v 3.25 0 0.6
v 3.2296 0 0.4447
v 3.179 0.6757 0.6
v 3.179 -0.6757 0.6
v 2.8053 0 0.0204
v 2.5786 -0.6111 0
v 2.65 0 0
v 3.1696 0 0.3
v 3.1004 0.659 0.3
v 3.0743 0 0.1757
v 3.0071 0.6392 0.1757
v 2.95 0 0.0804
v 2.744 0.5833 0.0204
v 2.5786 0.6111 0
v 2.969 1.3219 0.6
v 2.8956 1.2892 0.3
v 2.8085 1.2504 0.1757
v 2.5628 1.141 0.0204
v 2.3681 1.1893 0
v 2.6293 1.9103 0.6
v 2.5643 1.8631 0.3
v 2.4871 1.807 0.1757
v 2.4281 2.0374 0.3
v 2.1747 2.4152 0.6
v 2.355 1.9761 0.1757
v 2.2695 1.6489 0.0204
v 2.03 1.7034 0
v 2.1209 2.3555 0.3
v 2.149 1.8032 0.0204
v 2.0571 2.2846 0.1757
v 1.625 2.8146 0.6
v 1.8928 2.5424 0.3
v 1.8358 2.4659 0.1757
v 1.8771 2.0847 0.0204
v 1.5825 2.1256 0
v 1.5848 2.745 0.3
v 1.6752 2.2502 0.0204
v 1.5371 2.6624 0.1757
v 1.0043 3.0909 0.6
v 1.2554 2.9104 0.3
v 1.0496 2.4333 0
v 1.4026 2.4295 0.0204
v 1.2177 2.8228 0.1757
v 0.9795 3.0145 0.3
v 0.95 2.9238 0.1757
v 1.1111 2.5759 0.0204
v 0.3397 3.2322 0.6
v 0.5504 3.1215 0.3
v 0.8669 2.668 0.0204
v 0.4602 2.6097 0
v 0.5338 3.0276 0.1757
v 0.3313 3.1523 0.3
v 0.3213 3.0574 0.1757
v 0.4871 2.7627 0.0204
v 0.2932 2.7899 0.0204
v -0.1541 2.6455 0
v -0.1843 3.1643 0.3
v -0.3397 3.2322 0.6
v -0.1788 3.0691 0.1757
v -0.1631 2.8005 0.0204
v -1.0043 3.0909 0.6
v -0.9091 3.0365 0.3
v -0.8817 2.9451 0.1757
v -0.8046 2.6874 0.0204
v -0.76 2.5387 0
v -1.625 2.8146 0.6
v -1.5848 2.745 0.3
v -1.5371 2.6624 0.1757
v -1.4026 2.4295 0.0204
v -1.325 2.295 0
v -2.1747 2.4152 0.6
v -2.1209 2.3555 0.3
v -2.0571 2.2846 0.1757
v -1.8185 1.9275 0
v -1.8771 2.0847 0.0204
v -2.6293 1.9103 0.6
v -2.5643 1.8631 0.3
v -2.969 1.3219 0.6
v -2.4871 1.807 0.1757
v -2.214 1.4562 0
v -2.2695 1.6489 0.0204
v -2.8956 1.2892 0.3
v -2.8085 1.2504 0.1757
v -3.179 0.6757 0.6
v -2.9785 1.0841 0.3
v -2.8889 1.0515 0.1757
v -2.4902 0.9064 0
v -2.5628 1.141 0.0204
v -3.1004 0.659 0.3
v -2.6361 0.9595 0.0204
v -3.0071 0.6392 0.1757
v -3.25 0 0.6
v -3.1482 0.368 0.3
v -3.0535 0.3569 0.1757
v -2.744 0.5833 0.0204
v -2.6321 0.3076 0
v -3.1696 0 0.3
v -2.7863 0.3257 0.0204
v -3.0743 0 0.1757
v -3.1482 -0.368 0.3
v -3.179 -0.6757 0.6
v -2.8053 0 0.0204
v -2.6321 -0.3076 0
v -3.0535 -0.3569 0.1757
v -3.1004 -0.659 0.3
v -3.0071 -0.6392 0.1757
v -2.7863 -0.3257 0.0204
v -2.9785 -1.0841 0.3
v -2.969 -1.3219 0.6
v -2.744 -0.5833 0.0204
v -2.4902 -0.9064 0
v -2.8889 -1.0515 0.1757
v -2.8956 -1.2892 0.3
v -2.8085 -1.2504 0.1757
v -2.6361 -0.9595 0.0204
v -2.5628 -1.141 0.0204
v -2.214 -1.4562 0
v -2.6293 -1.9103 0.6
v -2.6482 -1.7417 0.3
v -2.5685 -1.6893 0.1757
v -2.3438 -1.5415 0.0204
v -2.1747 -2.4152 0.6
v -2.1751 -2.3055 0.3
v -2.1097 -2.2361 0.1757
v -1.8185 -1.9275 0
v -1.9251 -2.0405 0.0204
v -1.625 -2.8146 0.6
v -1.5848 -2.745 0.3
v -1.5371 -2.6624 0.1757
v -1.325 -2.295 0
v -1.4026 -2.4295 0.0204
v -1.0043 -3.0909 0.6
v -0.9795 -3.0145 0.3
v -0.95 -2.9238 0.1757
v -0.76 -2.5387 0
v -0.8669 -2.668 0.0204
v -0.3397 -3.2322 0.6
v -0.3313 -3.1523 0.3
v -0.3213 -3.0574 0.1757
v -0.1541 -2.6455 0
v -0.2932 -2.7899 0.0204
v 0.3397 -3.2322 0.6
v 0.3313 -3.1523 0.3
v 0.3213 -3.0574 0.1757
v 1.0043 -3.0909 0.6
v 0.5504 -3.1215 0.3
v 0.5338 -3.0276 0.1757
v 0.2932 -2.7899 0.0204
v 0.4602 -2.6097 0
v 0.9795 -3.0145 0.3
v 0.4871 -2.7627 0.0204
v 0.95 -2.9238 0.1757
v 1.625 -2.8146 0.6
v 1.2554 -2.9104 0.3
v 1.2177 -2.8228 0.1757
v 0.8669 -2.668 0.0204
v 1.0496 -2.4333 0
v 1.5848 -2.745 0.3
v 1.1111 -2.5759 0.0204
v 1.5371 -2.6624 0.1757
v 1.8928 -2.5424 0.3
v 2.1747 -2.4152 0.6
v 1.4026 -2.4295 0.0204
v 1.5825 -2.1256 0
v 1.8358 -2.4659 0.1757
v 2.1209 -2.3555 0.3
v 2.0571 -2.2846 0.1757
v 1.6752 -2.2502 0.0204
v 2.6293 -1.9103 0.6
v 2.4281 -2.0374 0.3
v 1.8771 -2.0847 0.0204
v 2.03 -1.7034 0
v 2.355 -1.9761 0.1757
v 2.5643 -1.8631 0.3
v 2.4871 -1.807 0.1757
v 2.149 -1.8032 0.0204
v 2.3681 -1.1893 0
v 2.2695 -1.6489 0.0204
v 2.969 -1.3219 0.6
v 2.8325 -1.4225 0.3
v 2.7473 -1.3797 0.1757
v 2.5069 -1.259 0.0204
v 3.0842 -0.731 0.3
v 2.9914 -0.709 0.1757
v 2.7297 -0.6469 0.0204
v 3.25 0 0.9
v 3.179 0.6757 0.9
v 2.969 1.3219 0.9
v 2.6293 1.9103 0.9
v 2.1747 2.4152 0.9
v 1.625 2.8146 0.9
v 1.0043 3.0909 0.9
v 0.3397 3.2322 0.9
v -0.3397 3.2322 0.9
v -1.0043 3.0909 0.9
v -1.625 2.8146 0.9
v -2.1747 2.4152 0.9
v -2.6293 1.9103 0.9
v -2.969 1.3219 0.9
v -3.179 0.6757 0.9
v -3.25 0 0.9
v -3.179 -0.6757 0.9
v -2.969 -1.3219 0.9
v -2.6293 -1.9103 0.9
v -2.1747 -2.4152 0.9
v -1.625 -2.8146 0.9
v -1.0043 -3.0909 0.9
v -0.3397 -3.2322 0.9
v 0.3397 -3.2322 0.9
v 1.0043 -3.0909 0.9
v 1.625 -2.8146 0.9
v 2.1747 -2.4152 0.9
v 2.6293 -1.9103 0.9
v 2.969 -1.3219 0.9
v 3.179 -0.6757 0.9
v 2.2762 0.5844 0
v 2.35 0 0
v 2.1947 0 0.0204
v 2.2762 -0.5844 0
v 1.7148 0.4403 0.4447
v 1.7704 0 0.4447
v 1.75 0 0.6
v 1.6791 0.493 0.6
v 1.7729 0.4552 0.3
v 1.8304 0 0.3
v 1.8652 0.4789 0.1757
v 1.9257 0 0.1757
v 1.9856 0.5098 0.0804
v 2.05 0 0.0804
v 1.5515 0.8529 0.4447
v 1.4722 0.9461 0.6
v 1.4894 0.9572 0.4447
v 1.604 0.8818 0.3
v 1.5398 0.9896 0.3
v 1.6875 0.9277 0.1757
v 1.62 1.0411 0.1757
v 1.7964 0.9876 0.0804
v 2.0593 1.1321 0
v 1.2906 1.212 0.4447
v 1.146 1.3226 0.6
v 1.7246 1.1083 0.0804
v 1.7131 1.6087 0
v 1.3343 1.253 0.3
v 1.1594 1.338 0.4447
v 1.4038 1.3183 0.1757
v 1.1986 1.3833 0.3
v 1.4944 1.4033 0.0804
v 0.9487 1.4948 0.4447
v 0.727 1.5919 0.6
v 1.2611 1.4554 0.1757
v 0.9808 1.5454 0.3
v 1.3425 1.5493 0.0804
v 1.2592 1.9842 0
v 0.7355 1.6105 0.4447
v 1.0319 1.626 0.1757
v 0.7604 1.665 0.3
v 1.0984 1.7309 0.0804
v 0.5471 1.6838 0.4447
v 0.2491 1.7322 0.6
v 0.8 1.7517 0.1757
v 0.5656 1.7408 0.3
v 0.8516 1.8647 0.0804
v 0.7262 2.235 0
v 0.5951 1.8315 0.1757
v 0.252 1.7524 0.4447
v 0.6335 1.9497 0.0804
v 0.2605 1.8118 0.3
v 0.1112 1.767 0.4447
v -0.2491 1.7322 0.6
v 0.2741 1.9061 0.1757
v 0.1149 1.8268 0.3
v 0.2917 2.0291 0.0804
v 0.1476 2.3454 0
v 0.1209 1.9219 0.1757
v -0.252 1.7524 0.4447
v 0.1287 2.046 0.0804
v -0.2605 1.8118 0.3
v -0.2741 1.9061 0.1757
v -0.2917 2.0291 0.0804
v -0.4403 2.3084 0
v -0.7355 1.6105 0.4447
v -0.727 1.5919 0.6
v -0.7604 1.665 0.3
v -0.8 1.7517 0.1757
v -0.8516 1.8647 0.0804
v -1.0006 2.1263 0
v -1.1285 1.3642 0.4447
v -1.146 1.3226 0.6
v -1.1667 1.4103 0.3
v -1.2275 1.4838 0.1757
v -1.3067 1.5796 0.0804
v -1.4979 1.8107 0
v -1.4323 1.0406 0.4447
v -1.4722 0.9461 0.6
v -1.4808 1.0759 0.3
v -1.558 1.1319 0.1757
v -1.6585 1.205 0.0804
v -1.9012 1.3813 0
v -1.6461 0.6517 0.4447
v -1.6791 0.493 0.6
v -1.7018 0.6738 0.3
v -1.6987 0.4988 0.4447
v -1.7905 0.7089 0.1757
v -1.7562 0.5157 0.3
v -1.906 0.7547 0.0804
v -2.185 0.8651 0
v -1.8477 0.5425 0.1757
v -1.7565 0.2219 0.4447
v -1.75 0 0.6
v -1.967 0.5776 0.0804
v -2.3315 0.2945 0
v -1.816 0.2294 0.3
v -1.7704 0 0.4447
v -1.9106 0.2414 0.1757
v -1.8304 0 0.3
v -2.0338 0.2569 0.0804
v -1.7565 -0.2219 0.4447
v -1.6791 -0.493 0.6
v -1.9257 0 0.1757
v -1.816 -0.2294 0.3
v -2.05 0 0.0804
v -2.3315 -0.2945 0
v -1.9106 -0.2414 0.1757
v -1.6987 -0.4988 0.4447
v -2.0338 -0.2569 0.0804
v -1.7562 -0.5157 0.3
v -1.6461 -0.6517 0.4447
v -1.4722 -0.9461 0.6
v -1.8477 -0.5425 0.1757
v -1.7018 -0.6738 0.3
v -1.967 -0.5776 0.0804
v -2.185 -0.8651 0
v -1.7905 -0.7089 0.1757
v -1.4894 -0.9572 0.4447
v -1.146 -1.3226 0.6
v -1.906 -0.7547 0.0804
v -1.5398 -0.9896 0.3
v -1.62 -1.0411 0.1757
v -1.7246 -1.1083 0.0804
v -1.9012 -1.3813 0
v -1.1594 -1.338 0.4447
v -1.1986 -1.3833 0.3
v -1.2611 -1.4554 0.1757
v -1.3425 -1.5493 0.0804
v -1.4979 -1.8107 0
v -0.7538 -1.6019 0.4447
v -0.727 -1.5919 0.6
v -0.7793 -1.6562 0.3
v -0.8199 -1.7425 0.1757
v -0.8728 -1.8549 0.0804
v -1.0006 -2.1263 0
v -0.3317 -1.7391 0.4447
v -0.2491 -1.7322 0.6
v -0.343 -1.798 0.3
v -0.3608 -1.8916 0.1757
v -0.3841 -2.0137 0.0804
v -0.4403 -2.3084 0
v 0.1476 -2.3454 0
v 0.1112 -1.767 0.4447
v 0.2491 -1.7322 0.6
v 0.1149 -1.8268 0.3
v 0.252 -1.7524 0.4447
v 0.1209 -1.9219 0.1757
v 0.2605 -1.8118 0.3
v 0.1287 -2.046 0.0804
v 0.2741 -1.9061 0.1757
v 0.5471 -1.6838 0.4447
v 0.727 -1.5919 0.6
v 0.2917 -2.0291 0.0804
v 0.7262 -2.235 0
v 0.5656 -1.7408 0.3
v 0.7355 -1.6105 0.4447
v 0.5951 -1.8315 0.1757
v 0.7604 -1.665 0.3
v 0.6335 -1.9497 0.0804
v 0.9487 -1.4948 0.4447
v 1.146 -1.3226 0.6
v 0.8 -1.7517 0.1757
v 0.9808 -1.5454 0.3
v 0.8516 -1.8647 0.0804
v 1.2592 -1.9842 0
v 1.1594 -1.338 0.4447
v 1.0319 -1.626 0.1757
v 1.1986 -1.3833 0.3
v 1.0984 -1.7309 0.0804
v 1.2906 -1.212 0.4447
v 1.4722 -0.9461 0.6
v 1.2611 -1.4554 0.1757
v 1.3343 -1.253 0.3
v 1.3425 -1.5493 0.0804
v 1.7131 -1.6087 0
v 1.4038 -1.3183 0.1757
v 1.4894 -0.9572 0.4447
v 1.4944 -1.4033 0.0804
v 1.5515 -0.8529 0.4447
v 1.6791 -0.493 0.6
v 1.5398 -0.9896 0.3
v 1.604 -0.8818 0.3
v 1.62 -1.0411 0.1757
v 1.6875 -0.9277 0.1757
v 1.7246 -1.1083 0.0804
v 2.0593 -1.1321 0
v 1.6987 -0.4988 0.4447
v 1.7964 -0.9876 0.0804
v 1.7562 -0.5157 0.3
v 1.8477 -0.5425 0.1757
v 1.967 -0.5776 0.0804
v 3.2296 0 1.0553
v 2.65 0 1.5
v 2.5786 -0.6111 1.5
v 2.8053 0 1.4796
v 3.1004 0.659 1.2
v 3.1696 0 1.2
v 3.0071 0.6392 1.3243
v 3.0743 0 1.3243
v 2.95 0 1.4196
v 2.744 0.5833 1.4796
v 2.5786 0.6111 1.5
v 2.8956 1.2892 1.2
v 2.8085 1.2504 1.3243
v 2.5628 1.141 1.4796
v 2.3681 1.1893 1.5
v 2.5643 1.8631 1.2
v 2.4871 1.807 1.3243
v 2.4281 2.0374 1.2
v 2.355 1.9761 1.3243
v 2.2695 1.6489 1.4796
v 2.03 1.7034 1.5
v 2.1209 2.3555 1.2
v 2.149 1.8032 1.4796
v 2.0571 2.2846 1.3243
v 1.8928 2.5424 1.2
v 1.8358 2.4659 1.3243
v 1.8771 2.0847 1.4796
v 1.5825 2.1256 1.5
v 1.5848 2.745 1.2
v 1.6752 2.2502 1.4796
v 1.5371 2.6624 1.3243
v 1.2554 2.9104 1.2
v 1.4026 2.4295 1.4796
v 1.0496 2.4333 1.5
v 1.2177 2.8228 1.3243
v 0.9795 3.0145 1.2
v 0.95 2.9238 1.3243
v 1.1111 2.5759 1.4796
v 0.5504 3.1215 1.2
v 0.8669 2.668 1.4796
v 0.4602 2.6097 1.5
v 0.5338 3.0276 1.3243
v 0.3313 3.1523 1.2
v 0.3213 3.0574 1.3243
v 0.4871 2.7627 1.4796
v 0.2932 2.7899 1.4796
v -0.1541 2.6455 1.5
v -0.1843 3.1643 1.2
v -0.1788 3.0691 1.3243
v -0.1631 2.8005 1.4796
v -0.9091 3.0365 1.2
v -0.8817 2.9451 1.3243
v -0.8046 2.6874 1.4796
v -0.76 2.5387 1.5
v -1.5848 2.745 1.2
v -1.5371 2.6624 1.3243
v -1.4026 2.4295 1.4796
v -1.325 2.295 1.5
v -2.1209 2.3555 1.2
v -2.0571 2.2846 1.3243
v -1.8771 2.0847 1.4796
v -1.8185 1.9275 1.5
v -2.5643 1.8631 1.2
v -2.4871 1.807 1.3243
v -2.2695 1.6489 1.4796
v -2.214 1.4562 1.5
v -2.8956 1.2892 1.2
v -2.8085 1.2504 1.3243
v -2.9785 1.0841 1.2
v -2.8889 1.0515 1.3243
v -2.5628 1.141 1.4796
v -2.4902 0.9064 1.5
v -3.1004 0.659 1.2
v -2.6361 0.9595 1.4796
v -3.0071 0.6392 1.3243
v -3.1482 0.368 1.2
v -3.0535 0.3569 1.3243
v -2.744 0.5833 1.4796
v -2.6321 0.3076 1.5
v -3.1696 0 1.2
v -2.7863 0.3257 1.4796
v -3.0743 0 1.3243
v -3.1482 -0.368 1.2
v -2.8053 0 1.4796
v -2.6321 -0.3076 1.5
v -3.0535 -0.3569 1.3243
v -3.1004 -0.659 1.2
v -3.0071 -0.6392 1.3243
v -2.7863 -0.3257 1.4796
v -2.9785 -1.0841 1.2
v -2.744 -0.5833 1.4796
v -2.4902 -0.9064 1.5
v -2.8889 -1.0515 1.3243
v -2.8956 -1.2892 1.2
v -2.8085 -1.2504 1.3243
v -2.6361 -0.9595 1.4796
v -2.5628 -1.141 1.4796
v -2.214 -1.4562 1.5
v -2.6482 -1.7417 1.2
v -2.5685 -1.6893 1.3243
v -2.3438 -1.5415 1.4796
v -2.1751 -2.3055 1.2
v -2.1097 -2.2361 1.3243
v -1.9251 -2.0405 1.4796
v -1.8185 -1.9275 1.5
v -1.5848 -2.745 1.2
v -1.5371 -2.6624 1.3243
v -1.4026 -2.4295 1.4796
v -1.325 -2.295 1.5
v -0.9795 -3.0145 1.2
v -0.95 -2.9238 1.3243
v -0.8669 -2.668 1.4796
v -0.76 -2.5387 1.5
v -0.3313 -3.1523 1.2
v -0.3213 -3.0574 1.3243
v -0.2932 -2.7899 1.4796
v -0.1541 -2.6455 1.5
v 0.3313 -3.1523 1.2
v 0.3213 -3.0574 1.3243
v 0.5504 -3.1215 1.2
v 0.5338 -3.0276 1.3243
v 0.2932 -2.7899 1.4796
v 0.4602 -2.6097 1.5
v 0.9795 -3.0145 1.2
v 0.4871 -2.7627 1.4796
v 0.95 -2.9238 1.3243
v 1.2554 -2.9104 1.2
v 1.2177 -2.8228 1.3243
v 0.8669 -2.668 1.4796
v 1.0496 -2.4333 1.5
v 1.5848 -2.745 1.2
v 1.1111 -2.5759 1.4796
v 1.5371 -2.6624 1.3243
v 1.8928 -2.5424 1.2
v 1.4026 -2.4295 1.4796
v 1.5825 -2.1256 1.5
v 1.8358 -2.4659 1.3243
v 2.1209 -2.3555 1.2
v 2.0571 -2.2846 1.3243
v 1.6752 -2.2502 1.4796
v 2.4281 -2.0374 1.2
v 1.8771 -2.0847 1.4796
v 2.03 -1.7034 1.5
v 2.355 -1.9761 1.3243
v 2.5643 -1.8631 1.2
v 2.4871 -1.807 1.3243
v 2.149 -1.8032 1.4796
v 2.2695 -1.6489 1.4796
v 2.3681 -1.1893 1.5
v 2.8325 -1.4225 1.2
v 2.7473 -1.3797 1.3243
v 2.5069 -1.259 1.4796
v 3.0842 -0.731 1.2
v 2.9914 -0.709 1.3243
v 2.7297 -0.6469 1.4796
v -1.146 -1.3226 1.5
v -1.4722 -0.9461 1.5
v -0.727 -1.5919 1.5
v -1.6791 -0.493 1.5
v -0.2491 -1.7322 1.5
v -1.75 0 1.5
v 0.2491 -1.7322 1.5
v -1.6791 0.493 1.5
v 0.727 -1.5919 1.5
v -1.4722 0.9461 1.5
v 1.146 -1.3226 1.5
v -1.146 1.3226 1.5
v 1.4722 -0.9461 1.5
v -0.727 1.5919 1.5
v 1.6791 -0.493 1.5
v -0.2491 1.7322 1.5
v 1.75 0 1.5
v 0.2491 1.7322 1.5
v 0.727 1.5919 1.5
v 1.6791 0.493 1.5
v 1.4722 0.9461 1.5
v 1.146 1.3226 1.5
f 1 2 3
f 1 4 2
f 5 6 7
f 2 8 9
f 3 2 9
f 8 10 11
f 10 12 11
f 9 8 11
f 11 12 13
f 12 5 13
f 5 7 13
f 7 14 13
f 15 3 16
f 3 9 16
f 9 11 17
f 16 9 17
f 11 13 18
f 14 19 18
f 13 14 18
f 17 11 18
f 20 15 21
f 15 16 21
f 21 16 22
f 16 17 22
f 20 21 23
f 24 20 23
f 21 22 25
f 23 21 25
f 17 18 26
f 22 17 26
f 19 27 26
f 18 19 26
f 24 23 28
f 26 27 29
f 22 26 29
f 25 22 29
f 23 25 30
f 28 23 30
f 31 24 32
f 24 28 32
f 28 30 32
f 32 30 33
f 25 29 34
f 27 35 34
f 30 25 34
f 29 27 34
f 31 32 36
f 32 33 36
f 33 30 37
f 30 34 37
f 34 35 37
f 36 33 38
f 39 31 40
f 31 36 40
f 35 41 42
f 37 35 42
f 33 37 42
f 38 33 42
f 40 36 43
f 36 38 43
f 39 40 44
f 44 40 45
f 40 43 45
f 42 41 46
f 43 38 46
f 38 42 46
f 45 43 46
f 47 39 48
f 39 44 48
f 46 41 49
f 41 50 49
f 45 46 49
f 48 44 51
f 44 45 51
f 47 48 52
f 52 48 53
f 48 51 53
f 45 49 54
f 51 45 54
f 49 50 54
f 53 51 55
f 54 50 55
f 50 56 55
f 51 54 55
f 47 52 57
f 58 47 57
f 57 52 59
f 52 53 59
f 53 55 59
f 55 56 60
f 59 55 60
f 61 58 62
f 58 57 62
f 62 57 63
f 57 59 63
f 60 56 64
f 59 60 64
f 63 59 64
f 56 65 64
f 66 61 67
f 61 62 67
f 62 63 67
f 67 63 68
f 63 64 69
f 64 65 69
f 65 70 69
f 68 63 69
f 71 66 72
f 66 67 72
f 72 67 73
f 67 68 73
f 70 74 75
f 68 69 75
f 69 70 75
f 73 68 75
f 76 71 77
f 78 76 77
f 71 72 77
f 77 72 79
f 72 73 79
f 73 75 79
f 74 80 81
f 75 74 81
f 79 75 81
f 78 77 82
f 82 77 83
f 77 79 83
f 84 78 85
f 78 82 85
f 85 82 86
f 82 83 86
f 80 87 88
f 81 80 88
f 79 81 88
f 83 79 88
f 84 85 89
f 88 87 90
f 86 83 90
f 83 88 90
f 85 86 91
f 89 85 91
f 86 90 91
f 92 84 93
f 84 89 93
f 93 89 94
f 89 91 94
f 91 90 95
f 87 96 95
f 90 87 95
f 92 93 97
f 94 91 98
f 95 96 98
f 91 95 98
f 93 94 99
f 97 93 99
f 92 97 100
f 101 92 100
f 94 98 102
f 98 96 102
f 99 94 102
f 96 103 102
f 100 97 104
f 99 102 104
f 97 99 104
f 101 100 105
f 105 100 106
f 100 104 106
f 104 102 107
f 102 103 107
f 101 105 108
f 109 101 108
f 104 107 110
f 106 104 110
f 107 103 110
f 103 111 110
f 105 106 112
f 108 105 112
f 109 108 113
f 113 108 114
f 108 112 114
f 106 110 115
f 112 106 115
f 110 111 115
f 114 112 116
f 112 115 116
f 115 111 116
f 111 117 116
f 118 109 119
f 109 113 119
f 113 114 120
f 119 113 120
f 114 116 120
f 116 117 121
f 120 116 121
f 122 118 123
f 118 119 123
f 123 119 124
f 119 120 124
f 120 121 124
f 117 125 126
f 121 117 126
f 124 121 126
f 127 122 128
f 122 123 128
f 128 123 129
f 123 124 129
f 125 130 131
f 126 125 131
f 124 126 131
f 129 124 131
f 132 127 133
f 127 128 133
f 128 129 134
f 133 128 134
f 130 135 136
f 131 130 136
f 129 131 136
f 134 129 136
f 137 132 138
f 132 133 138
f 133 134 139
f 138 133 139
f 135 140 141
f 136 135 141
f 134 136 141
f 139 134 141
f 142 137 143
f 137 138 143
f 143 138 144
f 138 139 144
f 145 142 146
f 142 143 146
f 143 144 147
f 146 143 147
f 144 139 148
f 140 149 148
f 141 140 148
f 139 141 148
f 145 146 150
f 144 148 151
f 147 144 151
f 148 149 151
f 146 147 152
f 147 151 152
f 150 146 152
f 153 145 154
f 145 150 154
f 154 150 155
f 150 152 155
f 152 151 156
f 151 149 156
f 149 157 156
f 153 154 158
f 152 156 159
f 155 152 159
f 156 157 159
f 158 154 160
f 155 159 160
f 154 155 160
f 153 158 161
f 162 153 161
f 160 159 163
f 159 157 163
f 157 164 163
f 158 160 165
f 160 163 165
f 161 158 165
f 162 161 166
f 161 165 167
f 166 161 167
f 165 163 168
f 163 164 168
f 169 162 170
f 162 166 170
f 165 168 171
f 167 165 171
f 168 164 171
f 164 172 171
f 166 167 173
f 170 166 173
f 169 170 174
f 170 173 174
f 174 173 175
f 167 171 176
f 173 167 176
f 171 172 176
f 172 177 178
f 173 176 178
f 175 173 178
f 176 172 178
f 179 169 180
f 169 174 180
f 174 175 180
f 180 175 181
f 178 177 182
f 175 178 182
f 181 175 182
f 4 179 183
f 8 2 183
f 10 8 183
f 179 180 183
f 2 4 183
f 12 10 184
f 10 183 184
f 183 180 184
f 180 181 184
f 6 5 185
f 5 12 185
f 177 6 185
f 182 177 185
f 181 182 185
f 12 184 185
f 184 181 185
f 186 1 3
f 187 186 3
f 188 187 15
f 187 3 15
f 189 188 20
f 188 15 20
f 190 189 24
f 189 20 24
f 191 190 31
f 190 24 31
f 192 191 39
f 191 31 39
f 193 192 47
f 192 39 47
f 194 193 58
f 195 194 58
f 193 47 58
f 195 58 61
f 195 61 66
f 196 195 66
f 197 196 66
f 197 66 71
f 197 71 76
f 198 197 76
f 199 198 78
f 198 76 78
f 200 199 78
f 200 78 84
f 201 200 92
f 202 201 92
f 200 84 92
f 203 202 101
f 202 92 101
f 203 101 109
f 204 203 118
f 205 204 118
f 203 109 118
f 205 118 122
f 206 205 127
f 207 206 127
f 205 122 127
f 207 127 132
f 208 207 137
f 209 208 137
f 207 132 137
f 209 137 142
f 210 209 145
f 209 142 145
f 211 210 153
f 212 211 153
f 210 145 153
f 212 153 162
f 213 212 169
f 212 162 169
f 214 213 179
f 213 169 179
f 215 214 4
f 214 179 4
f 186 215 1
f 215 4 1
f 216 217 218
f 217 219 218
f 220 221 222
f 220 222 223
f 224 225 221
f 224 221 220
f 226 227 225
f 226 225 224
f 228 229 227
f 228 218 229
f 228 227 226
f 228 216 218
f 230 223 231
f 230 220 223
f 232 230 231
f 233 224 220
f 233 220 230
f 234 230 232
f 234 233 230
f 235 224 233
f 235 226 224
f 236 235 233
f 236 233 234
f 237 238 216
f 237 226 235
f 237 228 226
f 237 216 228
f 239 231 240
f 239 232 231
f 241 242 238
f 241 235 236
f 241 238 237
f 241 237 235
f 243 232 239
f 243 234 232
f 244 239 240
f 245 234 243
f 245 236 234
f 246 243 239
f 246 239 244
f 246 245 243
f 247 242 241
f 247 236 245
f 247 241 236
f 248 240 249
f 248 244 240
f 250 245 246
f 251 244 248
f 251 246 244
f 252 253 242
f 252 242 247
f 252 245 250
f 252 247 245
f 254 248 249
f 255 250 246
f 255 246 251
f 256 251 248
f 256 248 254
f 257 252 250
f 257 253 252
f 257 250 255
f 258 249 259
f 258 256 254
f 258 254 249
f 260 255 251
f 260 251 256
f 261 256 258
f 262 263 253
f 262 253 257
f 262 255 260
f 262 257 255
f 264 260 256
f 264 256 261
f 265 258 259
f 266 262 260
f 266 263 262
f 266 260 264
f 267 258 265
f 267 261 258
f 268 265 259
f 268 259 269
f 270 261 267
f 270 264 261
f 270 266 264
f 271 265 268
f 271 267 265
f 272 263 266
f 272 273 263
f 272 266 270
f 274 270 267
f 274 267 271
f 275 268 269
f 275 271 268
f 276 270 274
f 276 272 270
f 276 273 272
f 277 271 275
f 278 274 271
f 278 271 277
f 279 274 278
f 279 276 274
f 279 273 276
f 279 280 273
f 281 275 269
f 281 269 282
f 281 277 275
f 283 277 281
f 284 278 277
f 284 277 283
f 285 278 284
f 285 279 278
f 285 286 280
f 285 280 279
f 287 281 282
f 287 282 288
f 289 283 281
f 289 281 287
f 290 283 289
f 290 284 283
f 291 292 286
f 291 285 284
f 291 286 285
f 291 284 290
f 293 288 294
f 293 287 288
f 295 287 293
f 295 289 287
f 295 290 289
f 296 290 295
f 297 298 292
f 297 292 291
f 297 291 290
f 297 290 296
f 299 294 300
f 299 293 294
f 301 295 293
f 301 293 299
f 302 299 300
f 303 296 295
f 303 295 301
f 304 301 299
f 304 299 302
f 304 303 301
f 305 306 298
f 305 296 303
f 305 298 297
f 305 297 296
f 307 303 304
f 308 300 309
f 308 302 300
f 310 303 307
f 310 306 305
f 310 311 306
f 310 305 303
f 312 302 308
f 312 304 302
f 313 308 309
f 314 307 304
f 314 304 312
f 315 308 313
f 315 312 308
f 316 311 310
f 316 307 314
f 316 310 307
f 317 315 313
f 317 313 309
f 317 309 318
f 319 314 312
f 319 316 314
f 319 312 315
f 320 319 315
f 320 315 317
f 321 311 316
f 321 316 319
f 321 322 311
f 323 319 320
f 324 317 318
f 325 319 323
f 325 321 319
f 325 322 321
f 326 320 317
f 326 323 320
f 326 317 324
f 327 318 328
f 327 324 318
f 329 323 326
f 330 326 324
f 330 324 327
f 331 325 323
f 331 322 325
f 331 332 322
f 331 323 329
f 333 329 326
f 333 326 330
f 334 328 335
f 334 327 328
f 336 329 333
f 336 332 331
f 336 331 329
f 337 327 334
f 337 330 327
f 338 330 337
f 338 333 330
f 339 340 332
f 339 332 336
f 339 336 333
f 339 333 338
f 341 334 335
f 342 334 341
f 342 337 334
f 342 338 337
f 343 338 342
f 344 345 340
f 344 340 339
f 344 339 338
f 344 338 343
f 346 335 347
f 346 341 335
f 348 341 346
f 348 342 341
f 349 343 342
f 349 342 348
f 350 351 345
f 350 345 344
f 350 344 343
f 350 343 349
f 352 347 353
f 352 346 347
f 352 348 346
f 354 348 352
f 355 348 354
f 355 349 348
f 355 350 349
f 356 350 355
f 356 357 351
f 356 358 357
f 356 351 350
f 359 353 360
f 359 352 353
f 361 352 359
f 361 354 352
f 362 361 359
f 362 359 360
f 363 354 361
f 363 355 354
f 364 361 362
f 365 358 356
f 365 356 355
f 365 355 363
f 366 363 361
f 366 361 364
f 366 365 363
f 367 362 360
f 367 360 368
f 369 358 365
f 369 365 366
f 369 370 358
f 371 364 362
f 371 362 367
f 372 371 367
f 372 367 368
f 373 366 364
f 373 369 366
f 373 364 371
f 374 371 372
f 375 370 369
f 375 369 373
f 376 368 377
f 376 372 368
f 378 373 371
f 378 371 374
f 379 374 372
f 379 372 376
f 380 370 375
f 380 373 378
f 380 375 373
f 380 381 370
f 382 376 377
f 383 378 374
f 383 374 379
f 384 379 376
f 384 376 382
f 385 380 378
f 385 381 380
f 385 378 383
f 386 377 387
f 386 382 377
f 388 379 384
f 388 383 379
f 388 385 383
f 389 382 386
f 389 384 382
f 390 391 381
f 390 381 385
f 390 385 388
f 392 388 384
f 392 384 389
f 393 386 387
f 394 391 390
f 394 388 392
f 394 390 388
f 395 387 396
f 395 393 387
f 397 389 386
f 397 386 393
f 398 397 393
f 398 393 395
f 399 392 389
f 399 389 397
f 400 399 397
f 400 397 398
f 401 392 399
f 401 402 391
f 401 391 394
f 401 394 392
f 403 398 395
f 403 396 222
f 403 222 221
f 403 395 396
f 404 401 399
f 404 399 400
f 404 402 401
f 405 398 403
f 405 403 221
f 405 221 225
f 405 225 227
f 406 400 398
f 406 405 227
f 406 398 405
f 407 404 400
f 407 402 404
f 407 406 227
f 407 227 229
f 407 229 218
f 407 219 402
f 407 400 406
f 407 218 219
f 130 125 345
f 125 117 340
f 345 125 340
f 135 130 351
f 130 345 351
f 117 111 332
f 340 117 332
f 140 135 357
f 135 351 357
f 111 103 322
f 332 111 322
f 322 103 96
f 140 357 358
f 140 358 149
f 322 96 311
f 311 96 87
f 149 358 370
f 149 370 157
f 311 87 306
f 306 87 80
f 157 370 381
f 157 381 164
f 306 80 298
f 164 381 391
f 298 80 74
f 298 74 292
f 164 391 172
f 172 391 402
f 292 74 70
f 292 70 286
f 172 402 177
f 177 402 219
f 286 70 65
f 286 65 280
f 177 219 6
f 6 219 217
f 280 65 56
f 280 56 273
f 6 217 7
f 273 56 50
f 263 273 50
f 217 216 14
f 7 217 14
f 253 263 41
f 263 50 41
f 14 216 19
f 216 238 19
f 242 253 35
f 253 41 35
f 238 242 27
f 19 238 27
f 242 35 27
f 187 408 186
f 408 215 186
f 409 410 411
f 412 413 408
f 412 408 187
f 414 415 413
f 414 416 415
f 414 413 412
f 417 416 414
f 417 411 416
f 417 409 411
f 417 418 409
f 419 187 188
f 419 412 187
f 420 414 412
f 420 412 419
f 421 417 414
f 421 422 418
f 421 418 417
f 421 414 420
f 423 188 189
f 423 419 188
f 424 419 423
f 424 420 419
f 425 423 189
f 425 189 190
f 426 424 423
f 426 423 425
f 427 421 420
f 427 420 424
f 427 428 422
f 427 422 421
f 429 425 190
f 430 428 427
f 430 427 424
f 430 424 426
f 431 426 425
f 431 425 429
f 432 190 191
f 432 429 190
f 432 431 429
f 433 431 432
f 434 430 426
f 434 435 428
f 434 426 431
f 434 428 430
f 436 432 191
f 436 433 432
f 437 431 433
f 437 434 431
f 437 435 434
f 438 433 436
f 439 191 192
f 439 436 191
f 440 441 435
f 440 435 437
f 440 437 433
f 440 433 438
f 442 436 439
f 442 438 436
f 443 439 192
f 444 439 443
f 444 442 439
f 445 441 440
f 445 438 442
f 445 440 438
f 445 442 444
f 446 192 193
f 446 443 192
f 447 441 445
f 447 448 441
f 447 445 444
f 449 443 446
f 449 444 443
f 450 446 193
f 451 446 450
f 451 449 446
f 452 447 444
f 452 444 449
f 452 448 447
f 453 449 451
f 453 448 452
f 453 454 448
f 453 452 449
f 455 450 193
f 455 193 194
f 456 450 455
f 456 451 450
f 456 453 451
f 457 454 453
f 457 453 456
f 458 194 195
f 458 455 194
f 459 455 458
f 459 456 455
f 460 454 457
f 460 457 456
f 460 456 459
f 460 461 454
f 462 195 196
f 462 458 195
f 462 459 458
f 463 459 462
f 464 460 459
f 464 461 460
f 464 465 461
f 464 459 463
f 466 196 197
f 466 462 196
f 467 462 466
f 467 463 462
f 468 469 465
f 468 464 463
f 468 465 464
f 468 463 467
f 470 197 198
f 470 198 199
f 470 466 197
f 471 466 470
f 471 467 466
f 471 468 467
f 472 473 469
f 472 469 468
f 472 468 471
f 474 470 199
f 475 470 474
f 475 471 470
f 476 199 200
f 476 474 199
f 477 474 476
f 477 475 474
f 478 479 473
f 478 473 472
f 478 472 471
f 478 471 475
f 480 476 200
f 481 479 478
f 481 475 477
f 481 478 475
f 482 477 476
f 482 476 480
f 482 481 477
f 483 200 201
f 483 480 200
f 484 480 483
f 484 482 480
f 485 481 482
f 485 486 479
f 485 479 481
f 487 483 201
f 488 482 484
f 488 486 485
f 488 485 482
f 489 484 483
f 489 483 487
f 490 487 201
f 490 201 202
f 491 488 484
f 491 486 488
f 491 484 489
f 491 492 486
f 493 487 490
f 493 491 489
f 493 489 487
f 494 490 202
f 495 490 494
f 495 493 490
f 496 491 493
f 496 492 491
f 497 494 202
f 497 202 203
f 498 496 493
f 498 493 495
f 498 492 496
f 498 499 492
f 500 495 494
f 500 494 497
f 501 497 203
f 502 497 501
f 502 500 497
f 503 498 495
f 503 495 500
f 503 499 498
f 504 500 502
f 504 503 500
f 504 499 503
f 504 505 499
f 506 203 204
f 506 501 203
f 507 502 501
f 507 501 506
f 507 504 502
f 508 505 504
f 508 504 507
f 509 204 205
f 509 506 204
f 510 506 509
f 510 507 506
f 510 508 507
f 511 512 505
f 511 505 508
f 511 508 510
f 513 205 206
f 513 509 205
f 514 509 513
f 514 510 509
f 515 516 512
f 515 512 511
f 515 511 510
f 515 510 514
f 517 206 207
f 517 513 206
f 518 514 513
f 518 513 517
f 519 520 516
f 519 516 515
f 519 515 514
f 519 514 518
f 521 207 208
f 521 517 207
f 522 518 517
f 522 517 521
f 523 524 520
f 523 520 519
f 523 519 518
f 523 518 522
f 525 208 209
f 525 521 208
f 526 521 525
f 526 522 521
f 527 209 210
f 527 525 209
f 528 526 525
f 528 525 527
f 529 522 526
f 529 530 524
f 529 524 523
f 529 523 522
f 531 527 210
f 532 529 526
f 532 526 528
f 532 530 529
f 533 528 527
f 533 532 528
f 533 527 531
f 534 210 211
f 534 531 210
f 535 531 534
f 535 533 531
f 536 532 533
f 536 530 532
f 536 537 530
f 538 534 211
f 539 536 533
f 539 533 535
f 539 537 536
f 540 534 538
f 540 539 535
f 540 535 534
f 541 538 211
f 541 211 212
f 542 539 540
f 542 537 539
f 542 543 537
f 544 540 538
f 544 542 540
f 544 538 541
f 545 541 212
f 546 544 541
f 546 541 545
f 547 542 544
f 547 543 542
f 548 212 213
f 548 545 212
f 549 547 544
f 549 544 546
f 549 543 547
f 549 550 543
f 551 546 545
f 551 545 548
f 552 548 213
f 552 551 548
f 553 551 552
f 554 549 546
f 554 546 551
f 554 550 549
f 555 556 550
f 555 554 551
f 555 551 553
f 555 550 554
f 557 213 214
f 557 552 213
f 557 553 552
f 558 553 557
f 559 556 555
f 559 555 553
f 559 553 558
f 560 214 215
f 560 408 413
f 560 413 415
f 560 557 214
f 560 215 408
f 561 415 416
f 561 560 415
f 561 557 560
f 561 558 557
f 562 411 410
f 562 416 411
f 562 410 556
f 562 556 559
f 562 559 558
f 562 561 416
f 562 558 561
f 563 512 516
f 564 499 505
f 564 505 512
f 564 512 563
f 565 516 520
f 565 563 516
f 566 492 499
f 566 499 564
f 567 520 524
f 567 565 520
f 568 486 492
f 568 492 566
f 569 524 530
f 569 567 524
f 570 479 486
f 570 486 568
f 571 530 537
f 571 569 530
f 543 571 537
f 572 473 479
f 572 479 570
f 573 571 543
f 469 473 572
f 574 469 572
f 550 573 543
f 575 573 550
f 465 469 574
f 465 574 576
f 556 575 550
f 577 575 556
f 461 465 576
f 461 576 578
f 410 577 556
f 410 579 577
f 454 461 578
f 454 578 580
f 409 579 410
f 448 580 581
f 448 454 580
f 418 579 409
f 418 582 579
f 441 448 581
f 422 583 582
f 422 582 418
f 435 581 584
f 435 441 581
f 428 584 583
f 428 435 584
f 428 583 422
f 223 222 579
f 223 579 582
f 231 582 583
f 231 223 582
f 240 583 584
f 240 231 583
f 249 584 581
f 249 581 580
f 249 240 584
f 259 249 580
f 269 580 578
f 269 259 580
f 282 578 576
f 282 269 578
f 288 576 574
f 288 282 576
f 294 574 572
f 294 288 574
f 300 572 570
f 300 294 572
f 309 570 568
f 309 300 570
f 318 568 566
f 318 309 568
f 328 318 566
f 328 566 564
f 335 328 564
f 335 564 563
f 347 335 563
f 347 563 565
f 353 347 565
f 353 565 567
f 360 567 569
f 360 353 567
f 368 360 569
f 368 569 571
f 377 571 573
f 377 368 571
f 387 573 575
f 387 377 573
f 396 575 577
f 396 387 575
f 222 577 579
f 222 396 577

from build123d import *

# Parameters (mm, degrees)
SKETCH1_R           = 3.25
SKETCH1_R_2         = 1.75
BOSS_EXTRUDE1_DEPTH = 1.5
FILLET1_R           = 0.6


with BuildPart() as part:
    # Sketch1 → Boss-Extrude1 (new body)
    with BuildSketch(Plane.XY):
        Circle(SKETCH1_R)
        Circle(SKETCH1_R_2, mode=Mode.SUBTRACT)
    extrude(amount=BOSS_EXTRUDE1_DEPTH)

    # Fillet1
    fillet1_edges = [part.edges().sort_by_distance(p)[0] for p in [
        (-3.25, 0, 0),
        (-3.25, 0, 1.5),
        (-1.75, 0, 0),
    ]]
    fillet(fillet1_edges, radius=FILLET1_R)


solid = part.part
